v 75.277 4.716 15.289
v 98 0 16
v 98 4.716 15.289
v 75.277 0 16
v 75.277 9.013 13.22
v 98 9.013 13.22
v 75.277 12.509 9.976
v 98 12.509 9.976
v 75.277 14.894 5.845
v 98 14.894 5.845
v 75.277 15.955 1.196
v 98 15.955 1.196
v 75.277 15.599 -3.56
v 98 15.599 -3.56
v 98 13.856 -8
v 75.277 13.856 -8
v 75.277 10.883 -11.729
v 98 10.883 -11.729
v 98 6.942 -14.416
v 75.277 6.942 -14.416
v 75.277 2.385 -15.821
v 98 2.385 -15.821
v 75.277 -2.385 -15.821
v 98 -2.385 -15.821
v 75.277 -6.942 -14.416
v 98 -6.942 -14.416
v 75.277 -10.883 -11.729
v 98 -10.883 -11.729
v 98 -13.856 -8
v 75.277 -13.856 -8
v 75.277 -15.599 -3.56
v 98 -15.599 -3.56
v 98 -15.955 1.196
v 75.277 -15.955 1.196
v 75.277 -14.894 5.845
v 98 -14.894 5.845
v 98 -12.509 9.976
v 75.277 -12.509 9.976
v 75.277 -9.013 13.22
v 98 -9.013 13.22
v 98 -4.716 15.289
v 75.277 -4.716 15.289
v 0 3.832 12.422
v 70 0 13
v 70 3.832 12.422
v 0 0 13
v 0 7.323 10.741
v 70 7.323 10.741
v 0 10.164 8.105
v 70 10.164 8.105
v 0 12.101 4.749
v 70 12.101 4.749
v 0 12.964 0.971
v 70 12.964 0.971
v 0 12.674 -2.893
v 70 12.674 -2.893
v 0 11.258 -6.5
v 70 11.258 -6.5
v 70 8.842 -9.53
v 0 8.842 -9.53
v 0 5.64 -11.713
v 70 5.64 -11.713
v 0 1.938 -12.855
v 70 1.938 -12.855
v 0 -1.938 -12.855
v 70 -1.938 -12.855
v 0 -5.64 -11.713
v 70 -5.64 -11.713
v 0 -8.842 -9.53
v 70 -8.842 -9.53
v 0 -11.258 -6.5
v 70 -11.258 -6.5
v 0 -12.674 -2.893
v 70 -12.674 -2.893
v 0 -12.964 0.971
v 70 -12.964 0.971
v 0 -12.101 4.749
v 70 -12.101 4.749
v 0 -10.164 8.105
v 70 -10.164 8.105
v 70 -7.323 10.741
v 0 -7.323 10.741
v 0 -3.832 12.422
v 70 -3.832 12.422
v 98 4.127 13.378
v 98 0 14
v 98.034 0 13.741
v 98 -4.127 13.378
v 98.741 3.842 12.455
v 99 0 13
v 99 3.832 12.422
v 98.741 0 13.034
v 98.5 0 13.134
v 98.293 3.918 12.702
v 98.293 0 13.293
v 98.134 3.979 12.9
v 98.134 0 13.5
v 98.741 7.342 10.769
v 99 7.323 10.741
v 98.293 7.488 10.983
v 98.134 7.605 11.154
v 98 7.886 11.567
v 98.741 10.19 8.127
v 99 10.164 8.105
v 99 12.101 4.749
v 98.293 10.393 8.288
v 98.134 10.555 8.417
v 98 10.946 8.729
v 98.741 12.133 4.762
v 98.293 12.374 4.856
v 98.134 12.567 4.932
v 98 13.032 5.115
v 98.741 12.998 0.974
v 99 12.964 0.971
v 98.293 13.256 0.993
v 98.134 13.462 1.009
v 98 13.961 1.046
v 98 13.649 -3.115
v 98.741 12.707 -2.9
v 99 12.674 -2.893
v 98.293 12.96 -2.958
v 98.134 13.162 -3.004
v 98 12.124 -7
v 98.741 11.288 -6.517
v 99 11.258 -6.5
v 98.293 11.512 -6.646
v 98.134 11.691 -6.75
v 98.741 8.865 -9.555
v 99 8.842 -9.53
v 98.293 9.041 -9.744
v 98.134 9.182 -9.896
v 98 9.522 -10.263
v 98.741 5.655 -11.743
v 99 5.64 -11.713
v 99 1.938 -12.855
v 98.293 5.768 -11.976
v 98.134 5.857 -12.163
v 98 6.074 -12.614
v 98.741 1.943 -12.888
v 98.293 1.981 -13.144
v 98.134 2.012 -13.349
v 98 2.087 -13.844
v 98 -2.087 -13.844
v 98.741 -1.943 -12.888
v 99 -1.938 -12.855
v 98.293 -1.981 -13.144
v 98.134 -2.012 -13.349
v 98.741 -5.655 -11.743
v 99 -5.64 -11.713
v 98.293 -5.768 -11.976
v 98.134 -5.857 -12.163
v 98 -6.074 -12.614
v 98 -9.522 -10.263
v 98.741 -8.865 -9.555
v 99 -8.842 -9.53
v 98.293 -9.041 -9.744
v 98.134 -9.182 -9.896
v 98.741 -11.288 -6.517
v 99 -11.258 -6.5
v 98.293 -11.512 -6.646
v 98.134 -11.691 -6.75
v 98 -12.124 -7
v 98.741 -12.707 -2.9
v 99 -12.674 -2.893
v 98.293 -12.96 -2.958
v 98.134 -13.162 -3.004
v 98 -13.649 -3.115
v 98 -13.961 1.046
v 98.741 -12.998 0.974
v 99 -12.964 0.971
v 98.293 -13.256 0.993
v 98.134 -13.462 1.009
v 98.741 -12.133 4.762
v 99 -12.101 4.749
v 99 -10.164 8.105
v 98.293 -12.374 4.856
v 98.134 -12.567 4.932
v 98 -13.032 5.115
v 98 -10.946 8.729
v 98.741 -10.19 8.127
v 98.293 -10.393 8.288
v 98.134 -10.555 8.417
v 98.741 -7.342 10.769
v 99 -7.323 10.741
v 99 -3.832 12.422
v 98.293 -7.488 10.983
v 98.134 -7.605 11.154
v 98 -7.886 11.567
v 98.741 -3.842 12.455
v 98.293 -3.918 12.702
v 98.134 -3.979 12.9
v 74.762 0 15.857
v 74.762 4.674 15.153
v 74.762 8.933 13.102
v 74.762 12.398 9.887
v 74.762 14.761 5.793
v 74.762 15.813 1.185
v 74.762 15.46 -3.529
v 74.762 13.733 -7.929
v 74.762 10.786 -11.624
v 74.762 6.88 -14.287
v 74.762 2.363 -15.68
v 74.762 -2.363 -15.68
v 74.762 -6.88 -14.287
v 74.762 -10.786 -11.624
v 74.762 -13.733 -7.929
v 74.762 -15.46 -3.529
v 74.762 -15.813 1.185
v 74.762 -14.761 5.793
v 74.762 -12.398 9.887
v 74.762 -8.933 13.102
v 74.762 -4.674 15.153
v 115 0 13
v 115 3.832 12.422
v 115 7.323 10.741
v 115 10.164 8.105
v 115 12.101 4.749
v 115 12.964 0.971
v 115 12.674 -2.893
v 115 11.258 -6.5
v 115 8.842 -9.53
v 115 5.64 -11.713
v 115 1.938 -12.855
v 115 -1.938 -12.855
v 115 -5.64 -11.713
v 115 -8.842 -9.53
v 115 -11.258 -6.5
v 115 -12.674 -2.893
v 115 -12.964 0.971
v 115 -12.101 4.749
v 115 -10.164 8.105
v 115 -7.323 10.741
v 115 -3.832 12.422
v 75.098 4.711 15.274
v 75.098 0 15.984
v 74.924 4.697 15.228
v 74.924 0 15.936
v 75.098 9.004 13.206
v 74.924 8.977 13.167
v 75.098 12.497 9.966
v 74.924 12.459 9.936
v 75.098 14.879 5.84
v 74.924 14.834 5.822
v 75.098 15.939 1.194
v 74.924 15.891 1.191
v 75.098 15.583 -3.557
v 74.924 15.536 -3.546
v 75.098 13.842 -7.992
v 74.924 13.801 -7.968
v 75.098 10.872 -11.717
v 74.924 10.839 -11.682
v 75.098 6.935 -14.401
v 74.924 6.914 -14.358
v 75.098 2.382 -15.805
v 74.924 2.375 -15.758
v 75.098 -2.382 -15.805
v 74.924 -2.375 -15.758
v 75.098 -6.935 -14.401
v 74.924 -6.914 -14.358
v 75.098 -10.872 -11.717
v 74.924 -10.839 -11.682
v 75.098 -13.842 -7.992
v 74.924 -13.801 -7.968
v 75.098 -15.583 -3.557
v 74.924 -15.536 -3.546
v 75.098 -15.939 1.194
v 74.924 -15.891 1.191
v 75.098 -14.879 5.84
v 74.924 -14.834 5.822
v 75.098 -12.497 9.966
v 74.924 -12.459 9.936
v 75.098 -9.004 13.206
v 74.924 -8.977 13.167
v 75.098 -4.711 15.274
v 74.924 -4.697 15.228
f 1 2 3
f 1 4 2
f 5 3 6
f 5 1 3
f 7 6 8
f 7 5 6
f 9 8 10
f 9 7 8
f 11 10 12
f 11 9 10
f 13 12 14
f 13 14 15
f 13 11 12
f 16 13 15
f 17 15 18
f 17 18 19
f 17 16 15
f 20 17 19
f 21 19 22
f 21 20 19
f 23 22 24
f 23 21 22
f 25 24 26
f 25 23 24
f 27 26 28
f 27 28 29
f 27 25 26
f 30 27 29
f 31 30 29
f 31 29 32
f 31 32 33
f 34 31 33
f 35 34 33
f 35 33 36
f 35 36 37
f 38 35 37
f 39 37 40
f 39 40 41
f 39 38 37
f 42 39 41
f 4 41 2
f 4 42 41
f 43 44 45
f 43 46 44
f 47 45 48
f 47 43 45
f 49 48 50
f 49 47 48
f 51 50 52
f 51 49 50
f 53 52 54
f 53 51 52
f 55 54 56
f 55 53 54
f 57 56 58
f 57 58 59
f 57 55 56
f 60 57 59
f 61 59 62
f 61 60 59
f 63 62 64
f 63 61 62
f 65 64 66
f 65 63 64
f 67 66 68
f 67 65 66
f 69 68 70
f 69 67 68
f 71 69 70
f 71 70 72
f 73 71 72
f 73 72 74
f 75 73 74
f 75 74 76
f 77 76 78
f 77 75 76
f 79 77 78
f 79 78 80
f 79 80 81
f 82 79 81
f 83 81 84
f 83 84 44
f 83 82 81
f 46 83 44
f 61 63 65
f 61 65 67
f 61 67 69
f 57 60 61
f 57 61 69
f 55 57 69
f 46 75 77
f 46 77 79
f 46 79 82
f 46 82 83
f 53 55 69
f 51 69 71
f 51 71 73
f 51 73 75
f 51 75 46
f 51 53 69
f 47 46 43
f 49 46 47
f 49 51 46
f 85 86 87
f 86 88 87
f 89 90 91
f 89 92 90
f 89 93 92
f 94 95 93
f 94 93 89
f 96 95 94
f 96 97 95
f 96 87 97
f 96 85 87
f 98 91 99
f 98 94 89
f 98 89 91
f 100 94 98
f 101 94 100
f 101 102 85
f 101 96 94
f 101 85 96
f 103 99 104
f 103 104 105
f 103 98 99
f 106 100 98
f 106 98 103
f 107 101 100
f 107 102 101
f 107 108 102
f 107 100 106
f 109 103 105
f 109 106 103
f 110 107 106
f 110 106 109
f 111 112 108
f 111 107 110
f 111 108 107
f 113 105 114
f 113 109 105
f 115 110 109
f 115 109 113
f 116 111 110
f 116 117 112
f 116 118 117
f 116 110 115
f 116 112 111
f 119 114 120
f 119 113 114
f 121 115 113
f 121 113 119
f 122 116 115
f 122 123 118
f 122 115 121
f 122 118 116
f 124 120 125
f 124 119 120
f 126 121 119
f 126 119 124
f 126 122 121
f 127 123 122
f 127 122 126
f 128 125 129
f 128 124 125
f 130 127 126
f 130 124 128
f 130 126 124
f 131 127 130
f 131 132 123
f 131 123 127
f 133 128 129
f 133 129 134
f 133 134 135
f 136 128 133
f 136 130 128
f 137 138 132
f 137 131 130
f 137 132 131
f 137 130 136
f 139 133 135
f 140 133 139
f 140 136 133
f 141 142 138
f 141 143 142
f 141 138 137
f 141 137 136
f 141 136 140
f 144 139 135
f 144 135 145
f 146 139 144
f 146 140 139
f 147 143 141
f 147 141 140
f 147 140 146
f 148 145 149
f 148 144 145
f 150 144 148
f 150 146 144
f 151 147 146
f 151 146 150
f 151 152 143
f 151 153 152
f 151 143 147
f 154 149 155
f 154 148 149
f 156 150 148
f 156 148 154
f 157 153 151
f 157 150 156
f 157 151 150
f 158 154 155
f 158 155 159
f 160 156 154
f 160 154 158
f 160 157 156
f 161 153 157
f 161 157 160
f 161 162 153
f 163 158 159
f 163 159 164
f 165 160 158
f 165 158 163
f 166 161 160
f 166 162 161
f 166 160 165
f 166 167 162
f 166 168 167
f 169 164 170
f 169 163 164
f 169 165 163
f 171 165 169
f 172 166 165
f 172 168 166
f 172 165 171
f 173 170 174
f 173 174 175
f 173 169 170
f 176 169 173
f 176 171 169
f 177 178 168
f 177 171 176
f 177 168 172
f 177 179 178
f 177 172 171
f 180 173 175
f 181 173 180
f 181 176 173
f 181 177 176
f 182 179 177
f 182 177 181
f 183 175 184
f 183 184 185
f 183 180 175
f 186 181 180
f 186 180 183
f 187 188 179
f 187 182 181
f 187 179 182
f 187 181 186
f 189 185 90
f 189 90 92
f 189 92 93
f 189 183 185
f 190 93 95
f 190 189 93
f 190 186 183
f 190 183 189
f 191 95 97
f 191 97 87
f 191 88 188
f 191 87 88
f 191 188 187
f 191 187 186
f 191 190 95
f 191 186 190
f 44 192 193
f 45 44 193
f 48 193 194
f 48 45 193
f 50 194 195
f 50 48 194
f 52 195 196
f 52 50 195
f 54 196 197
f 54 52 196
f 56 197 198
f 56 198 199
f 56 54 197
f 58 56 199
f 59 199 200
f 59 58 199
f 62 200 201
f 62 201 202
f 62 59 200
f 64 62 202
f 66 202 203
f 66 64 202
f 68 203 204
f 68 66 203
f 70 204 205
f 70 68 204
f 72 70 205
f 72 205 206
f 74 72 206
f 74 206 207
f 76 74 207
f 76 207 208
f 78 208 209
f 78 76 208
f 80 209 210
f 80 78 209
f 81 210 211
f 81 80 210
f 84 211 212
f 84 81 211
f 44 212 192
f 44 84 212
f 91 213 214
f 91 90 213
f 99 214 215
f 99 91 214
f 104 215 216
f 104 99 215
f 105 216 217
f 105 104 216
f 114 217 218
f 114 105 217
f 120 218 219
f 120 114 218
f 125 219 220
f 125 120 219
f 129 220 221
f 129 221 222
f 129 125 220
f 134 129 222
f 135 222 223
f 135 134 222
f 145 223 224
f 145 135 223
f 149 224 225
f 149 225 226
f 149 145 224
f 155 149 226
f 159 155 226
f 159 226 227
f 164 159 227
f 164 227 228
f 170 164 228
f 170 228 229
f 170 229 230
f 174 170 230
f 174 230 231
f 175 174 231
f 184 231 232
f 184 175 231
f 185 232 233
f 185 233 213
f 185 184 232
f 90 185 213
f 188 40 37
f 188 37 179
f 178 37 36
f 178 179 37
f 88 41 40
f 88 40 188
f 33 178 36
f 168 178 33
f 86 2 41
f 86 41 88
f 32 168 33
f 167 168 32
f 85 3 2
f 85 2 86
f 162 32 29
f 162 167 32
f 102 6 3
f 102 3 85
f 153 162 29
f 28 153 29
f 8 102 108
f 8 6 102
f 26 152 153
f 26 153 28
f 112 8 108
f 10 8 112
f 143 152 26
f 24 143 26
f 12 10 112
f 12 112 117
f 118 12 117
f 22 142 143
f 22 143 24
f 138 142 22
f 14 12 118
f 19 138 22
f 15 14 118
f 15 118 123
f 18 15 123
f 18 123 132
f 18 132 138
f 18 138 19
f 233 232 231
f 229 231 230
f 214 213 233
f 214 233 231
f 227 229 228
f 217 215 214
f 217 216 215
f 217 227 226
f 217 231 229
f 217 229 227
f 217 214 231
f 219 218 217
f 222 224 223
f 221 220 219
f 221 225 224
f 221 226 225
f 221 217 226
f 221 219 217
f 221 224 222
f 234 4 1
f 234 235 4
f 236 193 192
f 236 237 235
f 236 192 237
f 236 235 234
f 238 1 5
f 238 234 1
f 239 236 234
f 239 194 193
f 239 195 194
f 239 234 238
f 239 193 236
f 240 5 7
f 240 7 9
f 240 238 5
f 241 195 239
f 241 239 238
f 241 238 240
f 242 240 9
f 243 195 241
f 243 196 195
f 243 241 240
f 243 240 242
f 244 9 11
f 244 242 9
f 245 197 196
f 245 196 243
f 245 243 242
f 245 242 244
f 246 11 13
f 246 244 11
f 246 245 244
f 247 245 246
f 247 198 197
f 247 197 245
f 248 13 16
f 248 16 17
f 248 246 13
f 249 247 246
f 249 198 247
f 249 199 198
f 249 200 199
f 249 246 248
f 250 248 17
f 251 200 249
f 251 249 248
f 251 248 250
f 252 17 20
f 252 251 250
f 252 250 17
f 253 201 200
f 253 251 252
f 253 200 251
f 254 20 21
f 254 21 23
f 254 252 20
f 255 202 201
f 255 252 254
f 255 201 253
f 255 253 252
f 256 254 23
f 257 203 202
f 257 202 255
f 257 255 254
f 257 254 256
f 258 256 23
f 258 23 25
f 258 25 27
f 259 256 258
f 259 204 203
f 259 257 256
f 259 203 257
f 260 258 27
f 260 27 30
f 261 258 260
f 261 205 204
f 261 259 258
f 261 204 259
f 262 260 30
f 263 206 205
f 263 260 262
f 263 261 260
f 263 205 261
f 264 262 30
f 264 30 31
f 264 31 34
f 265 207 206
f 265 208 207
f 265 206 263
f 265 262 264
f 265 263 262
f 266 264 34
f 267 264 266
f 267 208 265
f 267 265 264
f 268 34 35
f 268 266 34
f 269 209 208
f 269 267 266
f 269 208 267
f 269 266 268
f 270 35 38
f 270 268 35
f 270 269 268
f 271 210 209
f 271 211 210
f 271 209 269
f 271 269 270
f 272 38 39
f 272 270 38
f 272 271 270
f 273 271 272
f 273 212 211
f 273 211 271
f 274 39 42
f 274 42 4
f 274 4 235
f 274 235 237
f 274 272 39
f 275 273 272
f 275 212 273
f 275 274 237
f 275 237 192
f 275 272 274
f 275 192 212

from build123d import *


with BuildPart() as f1:
    # F0 (on Front) → F1 (revolve)
    with BuildSketch(Plane.XZ):
        with BuildLine():
            ThreePointArc((75.276984, 16), (75.01005, 15.963715), (74.762488, 15.857493))
            Line((74.762488, 15.857493), (70, 13))
            Line((70, 13), (0, 13))
            Line((0, 13), (0, 0))
            Line((0, 0), (70, 0))
            Line((70, 0), (98, 0))
            Line((98, 0), (115, 0))
            Line((115, 0), (115, 13))
            Line((115, 13), (99, 13))
            ThreePointArc((99, 13), (98.292893, 13.292893), (98, 14))
            Line((98, 14), (98, 16))
            Line((98, 16), (75.276984, 16))
        make_face()
    revolve(axis=Axis((84, 0, 0), (-1, 0, 0)))


solid = f1.part
